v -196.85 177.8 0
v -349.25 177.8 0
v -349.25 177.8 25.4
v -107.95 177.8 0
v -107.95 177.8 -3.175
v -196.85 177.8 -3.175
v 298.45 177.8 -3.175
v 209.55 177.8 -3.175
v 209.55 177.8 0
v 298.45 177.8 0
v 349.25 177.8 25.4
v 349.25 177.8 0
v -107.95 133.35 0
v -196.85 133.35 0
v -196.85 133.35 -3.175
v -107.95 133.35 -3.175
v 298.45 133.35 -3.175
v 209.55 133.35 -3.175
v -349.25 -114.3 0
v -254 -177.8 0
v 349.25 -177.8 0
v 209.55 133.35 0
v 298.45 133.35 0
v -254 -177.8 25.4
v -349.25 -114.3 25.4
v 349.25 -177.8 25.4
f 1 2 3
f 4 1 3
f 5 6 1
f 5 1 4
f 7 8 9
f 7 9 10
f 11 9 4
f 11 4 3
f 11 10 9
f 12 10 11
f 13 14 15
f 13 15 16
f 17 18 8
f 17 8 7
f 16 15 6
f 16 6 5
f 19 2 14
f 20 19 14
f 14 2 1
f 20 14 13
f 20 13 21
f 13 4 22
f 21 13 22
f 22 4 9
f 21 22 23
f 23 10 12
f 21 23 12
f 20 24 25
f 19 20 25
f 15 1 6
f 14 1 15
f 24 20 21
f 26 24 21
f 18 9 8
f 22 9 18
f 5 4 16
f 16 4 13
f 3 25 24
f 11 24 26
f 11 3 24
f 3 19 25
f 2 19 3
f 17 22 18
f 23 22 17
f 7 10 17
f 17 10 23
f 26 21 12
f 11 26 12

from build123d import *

# Parameters (mm, degrees)
F0_W     = 698.5
F0_H     = 355.6
F1_DEPTH = 25.4
F3_DEPTH = 25.401
F4_W     = 88.9
F4_H     = 44.45
F5_DEPTH = 3.175


with BuildPart() as f1:
    # F0 (on Top) → F1 (new body)
    with BuildSketch(Plane.XY):
        Rectangle(F0_W, F0_H)
    extrude(amount=F1_DEPTH)

    # F2 (on face) → F3 (cut, through all)
    with BuildSketch(Plane.XY.offset(25.4)):
        Polygon((-254, -177.8), (-349.25, -114.3), (-349.25, -177.8), align=None)
    extrude(amount=-F3_DEPTH, mode=Mode.SUBTRACT)

    # F4 (on face) → F5 (join)
    with BuildSketch(Plane(origin=(0, 0, 0), x_dir=(1, 0, 0), z_dir=(0, 0, -1))):
        with Locations((254, -155.575)):
            Rectangle(F4_W, F4_H)
        with Locations((-152.4, -155.575)):
            Rectangle(F4_W, F4_H)
    extrude(amount=F5_DEPTH)


solid = f1.part
